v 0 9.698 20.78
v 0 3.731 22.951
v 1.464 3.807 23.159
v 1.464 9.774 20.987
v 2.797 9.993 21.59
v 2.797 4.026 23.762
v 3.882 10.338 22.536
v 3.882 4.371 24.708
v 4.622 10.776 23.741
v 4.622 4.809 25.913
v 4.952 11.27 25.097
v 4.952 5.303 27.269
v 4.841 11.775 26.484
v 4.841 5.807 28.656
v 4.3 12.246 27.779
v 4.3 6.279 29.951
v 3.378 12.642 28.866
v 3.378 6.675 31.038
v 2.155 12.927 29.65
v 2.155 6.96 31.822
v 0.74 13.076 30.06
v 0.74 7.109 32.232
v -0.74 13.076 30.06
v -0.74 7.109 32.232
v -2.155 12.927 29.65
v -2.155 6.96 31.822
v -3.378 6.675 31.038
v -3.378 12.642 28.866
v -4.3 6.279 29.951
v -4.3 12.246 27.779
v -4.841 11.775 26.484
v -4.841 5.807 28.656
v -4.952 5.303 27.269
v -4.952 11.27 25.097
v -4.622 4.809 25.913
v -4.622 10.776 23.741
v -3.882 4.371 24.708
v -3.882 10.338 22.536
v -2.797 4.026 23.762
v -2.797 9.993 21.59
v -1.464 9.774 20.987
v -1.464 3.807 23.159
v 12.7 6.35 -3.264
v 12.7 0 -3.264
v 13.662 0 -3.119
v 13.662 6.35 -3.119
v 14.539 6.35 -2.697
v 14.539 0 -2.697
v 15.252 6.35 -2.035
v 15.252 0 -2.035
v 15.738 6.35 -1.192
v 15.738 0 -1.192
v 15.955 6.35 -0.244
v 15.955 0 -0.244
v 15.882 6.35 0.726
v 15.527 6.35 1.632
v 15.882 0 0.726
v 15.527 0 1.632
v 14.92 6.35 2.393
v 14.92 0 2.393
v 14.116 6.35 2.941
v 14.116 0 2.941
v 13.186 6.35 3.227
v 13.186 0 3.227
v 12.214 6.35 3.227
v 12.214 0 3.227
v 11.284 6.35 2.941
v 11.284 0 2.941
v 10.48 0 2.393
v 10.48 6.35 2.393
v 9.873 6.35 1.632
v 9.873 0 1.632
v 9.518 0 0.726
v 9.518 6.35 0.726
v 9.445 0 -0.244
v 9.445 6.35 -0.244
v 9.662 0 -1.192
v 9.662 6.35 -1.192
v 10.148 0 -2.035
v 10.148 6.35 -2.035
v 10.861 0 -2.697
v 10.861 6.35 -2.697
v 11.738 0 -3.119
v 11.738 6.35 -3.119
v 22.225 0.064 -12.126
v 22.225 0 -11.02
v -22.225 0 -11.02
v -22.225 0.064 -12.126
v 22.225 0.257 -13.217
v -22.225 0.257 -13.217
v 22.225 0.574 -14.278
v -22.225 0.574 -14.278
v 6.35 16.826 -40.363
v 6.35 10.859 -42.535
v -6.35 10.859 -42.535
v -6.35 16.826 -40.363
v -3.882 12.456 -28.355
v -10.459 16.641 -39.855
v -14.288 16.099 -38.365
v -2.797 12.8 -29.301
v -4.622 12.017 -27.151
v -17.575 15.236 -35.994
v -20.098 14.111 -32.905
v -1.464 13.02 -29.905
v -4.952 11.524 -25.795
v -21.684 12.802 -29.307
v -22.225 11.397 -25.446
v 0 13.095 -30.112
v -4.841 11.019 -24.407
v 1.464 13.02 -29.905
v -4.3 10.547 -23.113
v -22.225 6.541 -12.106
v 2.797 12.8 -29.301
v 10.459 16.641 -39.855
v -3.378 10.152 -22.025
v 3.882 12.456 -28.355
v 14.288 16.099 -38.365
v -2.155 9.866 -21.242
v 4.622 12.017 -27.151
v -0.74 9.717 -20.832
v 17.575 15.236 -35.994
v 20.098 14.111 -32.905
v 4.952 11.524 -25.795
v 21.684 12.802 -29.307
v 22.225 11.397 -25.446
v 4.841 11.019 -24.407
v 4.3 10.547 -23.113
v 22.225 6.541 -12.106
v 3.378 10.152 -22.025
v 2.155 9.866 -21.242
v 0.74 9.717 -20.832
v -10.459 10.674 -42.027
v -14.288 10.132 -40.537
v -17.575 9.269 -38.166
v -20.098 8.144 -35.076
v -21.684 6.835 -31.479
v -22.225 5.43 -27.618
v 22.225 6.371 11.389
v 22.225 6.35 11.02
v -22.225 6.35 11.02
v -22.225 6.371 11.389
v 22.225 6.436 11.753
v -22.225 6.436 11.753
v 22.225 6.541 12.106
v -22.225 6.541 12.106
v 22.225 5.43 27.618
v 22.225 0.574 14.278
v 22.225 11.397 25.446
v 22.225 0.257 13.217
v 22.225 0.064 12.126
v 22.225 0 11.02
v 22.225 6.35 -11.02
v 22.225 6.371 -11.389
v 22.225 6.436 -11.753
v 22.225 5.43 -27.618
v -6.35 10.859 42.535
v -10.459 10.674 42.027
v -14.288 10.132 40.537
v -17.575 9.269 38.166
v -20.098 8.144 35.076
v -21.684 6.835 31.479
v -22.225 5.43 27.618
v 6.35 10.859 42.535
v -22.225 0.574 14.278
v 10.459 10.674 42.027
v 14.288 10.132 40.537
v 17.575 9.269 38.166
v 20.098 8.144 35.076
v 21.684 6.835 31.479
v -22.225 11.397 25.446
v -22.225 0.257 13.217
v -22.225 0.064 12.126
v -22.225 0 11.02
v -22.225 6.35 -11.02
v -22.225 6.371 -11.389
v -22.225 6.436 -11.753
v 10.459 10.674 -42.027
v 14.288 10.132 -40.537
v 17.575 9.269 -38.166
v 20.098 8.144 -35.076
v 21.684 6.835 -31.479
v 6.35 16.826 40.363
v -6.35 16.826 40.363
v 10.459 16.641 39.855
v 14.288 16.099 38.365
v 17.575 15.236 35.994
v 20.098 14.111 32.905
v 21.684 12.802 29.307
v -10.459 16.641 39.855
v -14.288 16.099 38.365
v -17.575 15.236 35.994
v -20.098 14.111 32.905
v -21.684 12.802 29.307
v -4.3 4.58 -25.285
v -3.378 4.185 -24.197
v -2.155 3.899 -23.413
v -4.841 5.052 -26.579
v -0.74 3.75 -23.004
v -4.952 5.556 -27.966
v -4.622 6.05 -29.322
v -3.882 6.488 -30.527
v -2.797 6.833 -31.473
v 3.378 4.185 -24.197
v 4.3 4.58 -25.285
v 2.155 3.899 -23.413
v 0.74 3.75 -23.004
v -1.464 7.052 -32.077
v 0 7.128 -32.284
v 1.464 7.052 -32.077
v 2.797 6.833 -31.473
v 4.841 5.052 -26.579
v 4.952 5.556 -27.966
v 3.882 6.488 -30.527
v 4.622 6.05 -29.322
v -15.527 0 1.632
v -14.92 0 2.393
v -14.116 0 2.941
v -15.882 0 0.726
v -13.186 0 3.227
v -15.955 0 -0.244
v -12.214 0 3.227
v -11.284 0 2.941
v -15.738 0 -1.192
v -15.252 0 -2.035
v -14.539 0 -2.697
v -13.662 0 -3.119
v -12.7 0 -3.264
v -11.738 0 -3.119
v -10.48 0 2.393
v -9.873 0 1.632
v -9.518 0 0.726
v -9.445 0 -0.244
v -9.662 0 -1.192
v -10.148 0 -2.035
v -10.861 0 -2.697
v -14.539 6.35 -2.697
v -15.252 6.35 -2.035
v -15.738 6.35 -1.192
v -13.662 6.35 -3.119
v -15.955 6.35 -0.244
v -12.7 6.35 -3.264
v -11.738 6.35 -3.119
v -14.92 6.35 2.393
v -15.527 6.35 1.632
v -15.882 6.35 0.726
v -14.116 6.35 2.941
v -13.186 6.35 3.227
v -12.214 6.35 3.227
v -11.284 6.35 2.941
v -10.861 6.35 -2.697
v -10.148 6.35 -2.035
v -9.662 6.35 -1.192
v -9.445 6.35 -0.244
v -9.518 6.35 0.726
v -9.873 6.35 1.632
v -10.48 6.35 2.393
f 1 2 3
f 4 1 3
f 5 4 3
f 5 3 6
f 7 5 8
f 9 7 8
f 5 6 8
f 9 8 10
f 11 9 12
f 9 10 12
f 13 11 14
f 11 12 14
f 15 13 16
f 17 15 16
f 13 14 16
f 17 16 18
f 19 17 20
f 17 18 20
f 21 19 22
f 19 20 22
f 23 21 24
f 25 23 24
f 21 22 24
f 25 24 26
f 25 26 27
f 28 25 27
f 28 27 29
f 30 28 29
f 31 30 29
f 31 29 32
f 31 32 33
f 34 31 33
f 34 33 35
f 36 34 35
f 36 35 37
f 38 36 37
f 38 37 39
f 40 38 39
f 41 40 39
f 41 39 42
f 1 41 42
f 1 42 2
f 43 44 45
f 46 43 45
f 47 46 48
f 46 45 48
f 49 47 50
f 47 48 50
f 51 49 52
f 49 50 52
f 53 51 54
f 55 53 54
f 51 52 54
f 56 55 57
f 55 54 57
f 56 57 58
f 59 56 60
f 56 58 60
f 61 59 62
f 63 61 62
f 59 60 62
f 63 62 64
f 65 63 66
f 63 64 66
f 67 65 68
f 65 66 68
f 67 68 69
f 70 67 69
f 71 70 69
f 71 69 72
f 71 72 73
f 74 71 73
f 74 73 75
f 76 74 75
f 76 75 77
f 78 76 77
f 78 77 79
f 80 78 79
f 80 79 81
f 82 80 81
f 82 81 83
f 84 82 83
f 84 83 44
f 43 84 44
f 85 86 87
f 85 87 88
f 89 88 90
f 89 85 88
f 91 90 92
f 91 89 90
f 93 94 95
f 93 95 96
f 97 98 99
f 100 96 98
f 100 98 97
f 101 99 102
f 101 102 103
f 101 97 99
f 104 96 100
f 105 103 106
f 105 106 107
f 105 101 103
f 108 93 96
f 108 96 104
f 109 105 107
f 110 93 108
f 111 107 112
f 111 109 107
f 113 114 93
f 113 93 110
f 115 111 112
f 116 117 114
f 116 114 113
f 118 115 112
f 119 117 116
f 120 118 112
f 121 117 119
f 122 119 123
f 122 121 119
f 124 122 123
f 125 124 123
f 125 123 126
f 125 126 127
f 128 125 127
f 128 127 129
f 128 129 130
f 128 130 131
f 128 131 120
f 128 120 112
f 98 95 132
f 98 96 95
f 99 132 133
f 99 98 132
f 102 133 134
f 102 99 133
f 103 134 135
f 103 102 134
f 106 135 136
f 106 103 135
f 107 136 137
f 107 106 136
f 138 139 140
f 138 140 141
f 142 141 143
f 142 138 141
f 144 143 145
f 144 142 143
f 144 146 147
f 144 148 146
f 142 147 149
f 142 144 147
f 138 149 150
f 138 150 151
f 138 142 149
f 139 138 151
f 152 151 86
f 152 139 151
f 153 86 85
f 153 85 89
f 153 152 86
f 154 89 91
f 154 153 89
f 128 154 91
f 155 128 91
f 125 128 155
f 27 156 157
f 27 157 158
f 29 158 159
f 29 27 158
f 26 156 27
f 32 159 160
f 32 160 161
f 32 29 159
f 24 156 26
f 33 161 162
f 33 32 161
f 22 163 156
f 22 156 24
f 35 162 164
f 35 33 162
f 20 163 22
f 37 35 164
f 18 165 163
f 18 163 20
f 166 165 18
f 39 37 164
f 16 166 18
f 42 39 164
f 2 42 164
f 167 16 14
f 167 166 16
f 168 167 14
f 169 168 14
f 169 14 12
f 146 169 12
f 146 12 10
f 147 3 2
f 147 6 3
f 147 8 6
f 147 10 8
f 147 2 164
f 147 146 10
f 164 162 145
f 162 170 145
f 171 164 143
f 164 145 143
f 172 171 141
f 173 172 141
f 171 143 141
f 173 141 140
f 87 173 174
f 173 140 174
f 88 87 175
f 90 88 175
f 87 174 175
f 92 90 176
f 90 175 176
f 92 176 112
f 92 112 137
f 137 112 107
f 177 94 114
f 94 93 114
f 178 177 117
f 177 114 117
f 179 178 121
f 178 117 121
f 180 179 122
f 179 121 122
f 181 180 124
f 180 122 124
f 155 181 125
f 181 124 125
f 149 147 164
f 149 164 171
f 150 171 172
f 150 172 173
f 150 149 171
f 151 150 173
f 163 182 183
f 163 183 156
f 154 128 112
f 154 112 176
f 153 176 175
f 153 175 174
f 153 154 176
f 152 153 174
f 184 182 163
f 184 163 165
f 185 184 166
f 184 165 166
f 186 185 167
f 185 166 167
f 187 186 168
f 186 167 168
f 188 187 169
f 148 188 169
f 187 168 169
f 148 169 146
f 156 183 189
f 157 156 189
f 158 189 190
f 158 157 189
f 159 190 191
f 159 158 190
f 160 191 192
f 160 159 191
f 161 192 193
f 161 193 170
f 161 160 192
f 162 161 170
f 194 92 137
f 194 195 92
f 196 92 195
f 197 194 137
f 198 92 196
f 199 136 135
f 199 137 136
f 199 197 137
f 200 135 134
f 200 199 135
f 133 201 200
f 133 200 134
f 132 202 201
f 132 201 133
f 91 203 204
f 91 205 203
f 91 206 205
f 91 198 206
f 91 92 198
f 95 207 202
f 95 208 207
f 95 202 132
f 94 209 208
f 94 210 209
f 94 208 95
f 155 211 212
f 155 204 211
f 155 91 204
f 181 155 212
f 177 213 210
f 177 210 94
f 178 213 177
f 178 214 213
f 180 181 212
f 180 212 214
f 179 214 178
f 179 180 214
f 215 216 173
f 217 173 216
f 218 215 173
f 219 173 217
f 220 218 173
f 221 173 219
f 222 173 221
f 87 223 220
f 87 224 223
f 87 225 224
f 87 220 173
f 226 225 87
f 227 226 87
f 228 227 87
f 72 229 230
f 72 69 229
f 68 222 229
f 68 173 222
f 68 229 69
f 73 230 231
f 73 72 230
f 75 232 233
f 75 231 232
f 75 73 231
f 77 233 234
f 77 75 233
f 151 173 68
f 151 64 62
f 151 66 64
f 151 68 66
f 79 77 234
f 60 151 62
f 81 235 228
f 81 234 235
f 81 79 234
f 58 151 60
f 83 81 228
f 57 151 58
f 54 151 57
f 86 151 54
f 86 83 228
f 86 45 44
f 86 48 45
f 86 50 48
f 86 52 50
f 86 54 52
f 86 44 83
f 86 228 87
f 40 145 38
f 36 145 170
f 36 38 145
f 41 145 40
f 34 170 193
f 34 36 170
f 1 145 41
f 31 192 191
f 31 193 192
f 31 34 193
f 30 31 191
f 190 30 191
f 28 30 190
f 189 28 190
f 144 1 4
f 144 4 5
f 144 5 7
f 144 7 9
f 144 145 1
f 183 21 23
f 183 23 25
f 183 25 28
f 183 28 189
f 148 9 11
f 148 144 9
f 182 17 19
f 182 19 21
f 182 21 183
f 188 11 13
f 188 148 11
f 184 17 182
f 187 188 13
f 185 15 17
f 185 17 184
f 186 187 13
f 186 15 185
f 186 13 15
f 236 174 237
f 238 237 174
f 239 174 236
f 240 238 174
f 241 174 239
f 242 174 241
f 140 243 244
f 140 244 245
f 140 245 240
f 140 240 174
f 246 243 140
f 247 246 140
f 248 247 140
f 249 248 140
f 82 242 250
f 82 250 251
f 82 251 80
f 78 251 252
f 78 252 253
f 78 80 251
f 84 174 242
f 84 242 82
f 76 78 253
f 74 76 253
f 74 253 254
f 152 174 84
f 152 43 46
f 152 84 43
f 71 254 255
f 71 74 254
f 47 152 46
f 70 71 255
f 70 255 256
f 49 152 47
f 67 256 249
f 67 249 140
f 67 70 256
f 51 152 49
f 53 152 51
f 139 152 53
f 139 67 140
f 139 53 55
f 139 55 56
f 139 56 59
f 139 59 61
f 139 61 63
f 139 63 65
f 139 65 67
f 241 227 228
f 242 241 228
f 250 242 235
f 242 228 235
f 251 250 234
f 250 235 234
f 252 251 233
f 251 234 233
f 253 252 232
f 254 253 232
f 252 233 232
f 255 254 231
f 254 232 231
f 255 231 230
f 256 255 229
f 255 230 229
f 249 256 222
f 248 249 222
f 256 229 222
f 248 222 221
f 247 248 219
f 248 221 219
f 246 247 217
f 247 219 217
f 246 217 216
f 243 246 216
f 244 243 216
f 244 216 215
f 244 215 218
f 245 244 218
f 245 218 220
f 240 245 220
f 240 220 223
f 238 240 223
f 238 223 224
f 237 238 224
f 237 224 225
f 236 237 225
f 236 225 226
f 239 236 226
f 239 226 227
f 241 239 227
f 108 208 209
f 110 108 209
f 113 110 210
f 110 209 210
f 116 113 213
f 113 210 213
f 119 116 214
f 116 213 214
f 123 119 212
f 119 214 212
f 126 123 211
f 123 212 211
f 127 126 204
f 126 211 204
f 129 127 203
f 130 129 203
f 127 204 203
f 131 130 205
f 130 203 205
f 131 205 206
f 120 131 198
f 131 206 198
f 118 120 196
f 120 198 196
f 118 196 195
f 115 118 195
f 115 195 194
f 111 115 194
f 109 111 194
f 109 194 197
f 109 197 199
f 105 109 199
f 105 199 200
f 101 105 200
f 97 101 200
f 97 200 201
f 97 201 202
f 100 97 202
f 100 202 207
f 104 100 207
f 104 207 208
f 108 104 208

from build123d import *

# Parameters (mm, degrees)
BASE_FLANGE1_DEPTH = 22.225
FILLET1_R          = 15.875
SKETCH6_R          = 4.9657
CUT_EXTRUDE1_DEPTH = 7.62
SKETCH7_R          = 4.9657
CUT_EXTRUDE2_DEPTH = 7.62
SKETCH8_R          = 3.2639
CUT_EXTRUDE3_DEPTH = 7.62


# Sheet-metal steps are written as plain solids
with BuildPart() as part:
    # Sketch1 → Base-Flange1 (new, symmetric)
    with BuildSketch(Plane(origin=(0, 0, 0), x_dir=(0, 0, -1), z_dir=(1, 0, 0))):
        with BuildLine():
            Line((-42.53524071, 10.859139551), (-14.278227374, 0.574427787))
            ThreePointArc((-14.278227374, 0.574427787), (-12.674484401, 0.144706153), (-11.020485509, 0))
            Line((-11.020485509, 0), (11.020485509, 0))
            ThreePointArc((11.020485509, 0), (12.674484401, 0.144706153), (14.278227374, 0.574427787))
            Line((14.278227374, 0.574427787), (42.53524071, 10.859139551))
            Line((42.53524071, 10.859139551), (40.3634128, 16.826187693))
            Line((40.3634128, 16.826187693), (12.106399464, 6.541475929))
            ThreePointArc((12.106399464, 6.541475929), (11.571818473, 6.398235384), (11.020485509, 6.35))
            Line((11.020485509, 6.35), (-11.020485509, 6.35))
            ThreePointArc((-11.020485509, 6.35), (-11.571818473, 6.398235384), (-12.106399464, 6.541475929))
            Line((-12.106399464, 6.541475929), (-40.3634128, 16.826187693))
            Line((-40.3634128, 16.826187693), (-42.53524071, 10.859139551))
        make_face()
    extrude(amount=BASE_FLANGE1_DEPTH, both=True)

    # Fillet1
    fillet1_edges = [part.edges().sort_by_distance(p)[0] for p in [
        (-22.225, 13.842663622, -41.449326755),
        (-22.225, 13.842663622, 41.449326755),
        (22.225, 13.842663622, -41.449326755),
        (22.225, 13.842663622, 41.449326755),
    ]]
    fillet(fillet1_edges, radius=FILLET1_R)

    # Sketch6 → Cut-Extrude1 (cut)
    with BuildSketch(Plane(origin=(0, -4.081701322, -1.485617786), x_dir=(1, 0, 0), z_dir=(0, -0.9396926207859082, -0.34202014332566943))):
        with Locations(Location((0, -27.809096284, 0), (0, 0, 270))):
            Circle(SKETCH6_R)
    extrude(amount=-CUT_EXTRUDE1_DEPTH, mode=Mode.SUBTRACT)

    # Sketch7 → Cut-Extrude2 (cut)
    with BuildSketch(Plane(origin=(0, -4.081701322, 1.485617786), x_dir=(1, 0, 0), z_dir=(0, -0.9396926207859082, 0.34202014332566943))):
        with Locations(Location((0, 27.809096284, 0), (0, 0, 270))):
            Circle(SKETCH7_R)
    extrude(amount=-CUT_EXTRUDE2_DEPTH, mode=Mode.SUBTRACT)

    # Sketch8 → Cut-Extrude3 (cut)
    with BuildSketch(Plane.XZ):
        with Locations(Location((-12.7, 0, 0), (0, 0, 270))):
            Circle(SKETCH8_R)
        with Locations(Location((12.7, 0, 0), (0, 0, 270))):
            Circle(SKETCH8_R)
    extrude(amount=-CUT_EXTRUDE3_DEPTH, mode=Mode.SUBTRACT)


solid = part.part
